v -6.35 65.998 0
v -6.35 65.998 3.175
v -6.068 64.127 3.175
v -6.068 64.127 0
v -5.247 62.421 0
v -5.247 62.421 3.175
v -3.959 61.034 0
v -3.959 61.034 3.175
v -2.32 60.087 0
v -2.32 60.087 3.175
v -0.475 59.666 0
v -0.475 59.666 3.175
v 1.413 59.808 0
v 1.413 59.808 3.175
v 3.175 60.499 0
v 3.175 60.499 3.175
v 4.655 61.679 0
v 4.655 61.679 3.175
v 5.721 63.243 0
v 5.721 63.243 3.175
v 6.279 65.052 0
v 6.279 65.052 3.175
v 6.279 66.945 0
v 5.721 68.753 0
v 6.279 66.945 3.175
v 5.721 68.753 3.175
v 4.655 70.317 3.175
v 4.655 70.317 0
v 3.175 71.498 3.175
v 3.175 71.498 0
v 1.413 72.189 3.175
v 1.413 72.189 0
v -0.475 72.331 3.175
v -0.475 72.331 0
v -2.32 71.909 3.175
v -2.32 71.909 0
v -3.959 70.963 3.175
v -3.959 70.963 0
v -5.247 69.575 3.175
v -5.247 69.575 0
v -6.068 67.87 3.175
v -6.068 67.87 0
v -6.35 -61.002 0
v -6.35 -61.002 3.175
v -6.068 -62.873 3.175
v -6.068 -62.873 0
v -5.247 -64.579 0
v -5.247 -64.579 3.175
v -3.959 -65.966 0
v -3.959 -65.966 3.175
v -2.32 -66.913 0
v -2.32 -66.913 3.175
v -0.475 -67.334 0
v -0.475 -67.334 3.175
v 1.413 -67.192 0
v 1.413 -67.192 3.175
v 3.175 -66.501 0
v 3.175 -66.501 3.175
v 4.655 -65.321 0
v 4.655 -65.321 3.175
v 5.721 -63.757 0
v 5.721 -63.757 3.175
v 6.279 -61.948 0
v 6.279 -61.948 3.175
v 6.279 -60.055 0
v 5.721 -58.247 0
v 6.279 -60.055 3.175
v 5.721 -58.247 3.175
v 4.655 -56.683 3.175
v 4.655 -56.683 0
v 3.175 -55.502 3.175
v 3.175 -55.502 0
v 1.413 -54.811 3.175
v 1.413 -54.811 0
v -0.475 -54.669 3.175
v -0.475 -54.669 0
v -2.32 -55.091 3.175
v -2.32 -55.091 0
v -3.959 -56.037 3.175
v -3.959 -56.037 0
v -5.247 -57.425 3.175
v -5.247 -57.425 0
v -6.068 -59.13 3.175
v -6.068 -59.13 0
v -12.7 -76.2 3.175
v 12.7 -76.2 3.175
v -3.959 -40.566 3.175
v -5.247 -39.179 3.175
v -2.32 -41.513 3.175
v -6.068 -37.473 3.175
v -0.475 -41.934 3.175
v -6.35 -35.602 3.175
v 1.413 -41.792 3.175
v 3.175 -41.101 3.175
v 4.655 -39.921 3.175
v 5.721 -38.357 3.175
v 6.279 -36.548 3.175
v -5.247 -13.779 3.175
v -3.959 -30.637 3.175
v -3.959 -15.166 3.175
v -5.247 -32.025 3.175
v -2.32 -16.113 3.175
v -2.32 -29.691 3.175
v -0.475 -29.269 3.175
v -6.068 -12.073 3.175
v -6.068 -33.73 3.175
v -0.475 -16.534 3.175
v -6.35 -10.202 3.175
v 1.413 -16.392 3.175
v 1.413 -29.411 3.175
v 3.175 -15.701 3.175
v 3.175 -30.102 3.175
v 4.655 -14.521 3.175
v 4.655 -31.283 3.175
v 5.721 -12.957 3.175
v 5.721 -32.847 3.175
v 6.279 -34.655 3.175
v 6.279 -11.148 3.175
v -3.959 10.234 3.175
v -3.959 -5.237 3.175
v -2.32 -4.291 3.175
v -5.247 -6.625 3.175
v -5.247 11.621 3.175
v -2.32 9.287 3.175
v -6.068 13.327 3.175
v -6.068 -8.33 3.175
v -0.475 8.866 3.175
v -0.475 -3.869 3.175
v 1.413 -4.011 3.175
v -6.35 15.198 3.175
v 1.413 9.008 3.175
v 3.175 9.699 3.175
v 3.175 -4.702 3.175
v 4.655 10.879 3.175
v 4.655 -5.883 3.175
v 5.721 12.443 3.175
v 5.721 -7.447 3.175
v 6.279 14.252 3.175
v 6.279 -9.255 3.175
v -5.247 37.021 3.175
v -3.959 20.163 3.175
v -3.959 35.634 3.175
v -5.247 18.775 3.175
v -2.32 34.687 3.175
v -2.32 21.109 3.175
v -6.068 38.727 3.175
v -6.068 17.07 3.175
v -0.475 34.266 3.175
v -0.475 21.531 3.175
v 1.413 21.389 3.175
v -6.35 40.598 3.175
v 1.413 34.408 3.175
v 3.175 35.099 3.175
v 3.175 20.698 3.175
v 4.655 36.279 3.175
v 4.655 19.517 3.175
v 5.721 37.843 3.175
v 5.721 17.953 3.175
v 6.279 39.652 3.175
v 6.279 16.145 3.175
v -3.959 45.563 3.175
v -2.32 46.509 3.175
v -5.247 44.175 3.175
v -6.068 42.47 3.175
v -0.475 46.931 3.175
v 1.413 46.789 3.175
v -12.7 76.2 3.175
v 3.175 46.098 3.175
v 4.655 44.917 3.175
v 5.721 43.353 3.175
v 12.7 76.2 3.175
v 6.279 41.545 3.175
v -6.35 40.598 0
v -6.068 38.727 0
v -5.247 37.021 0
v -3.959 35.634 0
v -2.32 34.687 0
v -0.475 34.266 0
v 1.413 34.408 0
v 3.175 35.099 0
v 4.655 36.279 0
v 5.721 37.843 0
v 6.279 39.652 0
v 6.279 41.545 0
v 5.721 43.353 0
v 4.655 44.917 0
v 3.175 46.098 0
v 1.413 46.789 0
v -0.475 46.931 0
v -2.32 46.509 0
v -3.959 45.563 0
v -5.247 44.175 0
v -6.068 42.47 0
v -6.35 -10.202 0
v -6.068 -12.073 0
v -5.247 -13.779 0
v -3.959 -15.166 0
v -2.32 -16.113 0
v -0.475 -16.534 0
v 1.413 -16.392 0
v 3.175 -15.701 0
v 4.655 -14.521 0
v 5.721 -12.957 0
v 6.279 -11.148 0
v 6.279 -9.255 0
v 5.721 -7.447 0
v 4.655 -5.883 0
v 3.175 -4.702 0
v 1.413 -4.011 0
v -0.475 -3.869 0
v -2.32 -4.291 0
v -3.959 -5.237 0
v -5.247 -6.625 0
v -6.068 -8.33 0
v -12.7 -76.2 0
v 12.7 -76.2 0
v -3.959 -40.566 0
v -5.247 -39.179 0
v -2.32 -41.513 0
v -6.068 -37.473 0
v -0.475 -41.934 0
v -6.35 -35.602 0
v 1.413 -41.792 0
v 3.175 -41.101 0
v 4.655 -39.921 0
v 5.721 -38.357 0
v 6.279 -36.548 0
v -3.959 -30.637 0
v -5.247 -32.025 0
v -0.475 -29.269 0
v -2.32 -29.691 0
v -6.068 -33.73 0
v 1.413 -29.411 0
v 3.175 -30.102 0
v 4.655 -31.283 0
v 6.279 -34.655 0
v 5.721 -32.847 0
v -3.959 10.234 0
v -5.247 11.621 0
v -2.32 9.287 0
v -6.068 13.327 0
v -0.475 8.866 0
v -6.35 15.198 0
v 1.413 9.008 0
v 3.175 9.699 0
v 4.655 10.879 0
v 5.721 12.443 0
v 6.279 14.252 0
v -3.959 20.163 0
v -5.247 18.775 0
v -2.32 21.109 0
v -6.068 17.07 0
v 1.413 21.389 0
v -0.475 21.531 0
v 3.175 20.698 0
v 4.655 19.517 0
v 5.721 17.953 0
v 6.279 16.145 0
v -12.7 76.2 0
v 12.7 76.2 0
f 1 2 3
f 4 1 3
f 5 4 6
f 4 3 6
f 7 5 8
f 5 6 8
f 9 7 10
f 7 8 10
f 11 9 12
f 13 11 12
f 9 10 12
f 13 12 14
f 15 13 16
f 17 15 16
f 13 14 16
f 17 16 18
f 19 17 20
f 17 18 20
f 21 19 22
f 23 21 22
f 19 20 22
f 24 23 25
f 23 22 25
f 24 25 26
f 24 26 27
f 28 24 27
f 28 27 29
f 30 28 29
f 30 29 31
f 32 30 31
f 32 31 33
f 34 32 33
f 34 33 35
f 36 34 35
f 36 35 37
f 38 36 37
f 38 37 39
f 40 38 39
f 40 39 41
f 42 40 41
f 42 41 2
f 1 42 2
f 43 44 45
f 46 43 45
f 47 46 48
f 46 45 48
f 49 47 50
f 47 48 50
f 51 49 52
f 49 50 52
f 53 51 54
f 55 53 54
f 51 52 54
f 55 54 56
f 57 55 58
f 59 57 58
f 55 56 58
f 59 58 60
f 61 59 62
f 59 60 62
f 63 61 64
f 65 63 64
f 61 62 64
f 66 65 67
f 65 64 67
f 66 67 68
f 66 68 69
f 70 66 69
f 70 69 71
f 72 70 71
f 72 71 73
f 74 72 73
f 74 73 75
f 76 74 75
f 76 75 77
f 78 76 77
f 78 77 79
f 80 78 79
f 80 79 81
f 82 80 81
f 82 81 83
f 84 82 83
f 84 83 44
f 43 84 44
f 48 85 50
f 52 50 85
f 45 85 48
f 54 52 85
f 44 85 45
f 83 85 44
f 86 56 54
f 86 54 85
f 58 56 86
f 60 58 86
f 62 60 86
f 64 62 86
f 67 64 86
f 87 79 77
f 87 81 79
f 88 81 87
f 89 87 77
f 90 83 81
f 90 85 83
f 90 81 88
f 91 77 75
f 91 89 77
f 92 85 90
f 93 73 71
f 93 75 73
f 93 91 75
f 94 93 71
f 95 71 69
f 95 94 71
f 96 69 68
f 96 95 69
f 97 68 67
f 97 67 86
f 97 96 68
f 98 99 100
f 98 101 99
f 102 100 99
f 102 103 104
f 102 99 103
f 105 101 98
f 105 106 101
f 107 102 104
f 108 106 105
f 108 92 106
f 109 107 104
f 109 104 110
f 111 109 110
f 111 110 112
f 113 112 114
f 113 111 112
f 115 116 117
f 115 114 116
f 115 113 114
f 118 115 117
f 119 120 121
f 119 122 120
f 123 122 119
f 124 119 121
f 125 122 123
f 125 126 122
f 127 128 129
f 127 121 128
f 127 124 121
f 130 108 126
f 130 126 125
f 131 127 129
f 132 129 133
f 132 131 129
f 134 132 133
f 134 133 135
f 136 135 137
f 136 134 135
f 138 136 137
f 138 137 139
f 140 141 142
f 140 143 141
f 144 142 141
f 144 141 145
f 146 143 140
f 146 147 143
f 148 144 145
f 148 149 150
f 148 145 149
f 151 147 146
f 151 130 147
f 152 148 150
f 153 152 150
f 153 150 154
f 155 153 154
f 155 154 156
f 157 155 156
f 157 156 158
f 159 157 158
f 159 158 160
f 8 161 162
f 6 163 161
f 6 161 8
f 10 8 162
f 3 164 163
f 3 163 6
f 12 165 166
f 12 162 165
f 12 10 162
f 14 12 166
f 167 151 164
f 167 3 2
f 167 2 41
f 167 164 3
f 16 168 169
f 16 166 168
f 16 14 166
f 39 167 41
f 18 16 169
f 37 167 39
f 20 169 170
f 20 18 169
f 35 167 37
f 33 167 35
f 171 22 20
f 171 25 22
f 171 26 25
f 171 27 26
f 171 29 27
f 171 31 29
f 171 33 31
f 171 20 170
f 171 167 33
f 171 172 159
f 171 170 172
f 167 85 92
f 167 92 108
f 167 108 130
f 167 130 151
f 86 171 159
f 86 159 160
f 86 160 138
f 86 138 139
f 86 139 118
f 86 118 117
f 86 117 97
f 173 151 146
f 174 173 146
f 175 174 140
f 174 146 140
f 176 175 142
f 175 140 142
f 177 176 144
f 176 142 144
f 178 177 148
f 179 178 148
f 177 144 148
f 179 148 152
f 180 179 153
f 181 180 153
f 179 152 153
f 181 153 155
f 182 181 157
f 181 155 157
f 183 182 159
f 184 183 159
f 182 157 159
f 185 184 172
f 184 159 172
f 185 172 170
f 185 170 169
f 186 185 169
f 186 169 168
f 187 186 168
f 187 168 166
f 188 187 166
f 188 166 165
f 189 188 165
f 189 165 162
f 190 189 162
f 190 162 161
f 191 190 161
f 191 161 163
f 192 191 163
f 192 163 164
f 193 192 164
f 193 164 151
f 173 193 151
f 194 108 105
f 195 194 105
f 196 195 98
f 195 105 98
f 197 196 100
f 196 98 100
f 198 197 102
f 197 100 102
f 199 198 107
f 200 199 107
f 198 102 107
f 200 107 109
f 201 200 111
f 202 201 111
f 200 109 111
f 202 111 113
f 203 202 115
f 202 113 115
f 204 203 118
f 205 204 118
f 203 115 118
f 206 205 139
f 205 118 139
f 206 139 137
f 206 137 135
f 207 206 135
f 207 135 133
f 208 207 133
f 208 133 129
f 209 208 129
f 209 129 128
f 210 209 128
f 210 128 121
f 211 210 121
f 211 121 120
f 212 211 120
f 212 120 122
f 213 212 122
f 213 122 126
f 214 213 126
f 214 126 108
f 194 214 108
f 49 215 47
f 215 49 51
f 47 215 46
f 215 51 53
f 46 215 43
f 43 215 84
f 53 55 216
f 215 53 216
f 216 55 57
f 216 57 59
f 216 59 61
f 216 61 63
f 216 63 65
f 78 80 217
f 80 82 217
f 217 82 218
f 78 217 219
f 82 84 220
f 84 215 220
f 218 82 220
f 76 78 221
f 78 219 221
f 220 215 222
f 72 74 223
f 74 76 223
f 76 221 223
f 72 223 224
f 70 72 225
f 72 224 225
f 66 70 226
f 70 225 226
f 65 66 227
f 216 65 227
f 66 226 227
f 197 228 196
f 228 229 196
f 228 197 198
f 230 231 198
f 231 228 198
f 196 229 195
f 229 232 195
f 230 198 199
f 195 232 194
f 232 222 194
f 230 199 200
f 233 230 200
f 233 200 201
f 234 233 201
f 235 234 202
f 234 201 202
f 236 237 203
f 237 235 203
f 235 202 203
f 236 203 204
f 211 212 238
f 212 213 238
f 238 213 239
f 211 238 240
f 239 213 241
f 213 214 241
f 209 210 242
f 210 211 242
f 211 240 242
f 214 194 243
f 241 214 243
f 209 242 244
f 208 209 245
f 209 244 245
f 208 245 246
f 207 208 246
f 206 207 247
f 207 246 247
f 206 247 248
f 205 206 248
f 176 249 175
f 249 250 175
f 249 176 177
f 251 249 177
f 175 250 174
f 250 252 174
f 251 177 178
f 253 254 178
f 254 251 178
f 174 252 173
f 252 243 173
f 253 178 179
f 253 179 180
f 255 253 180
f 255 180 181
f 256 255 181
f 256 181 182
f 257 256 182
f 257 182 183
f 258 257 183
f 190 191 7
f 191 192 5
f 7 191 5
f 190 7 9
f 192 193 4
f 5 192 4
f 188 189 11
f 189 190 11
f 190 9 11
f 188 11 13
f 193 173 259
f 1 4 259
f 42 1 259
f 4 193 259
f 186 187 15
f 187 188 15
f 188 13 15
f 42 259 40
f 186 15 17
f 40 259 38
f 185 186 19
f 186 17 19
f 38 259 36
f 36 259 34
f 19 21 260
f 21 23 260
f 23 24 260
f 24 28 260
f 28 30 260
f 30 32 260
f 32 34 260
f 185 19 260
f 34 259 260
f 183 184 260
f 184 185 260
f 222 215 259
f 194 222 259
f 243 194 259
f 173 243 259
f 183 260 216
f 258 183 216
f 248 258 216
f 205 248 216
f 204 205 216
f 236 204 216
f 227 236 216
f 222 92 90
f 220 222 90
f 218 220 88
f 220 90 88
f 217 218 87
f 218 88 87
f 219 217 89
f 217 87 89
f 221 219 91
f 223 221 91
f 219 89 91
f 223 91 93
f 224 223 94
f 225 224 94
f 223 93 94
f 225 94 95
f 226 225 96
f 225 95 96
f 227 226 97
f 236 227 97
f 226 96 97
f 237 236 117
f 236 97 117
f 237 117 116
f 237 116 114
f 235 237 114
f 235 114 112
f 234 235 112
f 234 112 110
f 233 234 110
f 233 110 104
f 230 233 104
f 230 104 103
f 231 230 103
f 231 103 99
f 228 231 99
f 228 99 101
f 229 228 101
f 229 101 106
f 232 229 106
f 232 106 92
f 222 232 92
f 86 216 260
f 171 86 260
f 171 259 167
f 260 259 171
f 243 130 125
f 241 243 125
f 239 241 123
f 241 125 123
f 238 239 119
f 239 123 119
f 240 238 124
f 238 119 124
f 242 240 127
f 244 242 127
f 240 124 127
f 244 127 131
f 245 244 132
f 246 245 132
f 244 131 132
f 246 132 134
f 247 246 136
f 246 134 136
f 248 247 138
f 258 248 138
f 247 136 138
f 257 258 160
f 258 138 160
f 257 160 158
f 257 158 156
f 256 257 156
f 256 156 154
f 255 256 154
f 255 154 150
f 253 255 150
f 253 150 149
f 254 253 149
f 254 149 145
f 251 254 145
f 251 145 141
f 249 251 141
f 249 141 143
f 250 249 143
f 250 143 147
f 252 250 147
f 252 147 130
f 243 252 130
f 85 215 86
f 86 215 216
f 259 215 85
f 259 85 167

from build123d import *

# Parameters (mm, degrees)
F0_W     = 25.4
F0_H     = 152.4
F1_DEPTH = 3.175
F3_D     = 12.7
F3_DEPTH = 25.4
F3_TIP   = 3.8154649308
F4_D     = 12.7
F4_DEPTH = 25.4
F4_TIP   = 3.8154649308


with BuildPart() as f1:
    # F0 (on Top) → F1 (new body)
    with BuildSketch(Plane.XY):
        Rectangle(F0_W, F0_H)
    extrude(amount=F1_DEPTH)

    # F3
    with Locations(Plane(origin=(0, 0, 0), x_dir=(1, 0, 0), z_dir=(0, 0, -1))):
        with Locations((0, 61.0016693357)):
            Hole(F3_D / 2, depth=F3_DEPTH)
            with Locations((0, 0, -(F3_DEPTH + F3_TIP / 2))):  # 118° drill point
                Cone(0, F3_D / 2, F3_TIP, mode=Mode.SUBTRACT)

    # F4
    with Locations(Plane(origin=(0, 0, 0), x_dir=(1, 0, 0), z_dir=(0, 0, -1))):
        with Locations((0, 35.6016693357), (0, 10.2016693357), (0, -15.1983306643), (0, -40.5983306643), (0, -65.9983306643), (0, -91.3983306643), (0, -116.7983306643), (0, -142.1983306643)):
            Hole(F4_D / 2, depth=F4_DEPTH)
            with Locations((0, 0, -(F4_DEPTH + F4_TIP / 2))):  # 118° drill point
                Cone(0, F4_D / 2, F4_TIP, mode=Mode.SUBTRACT)


solid = f1.part
